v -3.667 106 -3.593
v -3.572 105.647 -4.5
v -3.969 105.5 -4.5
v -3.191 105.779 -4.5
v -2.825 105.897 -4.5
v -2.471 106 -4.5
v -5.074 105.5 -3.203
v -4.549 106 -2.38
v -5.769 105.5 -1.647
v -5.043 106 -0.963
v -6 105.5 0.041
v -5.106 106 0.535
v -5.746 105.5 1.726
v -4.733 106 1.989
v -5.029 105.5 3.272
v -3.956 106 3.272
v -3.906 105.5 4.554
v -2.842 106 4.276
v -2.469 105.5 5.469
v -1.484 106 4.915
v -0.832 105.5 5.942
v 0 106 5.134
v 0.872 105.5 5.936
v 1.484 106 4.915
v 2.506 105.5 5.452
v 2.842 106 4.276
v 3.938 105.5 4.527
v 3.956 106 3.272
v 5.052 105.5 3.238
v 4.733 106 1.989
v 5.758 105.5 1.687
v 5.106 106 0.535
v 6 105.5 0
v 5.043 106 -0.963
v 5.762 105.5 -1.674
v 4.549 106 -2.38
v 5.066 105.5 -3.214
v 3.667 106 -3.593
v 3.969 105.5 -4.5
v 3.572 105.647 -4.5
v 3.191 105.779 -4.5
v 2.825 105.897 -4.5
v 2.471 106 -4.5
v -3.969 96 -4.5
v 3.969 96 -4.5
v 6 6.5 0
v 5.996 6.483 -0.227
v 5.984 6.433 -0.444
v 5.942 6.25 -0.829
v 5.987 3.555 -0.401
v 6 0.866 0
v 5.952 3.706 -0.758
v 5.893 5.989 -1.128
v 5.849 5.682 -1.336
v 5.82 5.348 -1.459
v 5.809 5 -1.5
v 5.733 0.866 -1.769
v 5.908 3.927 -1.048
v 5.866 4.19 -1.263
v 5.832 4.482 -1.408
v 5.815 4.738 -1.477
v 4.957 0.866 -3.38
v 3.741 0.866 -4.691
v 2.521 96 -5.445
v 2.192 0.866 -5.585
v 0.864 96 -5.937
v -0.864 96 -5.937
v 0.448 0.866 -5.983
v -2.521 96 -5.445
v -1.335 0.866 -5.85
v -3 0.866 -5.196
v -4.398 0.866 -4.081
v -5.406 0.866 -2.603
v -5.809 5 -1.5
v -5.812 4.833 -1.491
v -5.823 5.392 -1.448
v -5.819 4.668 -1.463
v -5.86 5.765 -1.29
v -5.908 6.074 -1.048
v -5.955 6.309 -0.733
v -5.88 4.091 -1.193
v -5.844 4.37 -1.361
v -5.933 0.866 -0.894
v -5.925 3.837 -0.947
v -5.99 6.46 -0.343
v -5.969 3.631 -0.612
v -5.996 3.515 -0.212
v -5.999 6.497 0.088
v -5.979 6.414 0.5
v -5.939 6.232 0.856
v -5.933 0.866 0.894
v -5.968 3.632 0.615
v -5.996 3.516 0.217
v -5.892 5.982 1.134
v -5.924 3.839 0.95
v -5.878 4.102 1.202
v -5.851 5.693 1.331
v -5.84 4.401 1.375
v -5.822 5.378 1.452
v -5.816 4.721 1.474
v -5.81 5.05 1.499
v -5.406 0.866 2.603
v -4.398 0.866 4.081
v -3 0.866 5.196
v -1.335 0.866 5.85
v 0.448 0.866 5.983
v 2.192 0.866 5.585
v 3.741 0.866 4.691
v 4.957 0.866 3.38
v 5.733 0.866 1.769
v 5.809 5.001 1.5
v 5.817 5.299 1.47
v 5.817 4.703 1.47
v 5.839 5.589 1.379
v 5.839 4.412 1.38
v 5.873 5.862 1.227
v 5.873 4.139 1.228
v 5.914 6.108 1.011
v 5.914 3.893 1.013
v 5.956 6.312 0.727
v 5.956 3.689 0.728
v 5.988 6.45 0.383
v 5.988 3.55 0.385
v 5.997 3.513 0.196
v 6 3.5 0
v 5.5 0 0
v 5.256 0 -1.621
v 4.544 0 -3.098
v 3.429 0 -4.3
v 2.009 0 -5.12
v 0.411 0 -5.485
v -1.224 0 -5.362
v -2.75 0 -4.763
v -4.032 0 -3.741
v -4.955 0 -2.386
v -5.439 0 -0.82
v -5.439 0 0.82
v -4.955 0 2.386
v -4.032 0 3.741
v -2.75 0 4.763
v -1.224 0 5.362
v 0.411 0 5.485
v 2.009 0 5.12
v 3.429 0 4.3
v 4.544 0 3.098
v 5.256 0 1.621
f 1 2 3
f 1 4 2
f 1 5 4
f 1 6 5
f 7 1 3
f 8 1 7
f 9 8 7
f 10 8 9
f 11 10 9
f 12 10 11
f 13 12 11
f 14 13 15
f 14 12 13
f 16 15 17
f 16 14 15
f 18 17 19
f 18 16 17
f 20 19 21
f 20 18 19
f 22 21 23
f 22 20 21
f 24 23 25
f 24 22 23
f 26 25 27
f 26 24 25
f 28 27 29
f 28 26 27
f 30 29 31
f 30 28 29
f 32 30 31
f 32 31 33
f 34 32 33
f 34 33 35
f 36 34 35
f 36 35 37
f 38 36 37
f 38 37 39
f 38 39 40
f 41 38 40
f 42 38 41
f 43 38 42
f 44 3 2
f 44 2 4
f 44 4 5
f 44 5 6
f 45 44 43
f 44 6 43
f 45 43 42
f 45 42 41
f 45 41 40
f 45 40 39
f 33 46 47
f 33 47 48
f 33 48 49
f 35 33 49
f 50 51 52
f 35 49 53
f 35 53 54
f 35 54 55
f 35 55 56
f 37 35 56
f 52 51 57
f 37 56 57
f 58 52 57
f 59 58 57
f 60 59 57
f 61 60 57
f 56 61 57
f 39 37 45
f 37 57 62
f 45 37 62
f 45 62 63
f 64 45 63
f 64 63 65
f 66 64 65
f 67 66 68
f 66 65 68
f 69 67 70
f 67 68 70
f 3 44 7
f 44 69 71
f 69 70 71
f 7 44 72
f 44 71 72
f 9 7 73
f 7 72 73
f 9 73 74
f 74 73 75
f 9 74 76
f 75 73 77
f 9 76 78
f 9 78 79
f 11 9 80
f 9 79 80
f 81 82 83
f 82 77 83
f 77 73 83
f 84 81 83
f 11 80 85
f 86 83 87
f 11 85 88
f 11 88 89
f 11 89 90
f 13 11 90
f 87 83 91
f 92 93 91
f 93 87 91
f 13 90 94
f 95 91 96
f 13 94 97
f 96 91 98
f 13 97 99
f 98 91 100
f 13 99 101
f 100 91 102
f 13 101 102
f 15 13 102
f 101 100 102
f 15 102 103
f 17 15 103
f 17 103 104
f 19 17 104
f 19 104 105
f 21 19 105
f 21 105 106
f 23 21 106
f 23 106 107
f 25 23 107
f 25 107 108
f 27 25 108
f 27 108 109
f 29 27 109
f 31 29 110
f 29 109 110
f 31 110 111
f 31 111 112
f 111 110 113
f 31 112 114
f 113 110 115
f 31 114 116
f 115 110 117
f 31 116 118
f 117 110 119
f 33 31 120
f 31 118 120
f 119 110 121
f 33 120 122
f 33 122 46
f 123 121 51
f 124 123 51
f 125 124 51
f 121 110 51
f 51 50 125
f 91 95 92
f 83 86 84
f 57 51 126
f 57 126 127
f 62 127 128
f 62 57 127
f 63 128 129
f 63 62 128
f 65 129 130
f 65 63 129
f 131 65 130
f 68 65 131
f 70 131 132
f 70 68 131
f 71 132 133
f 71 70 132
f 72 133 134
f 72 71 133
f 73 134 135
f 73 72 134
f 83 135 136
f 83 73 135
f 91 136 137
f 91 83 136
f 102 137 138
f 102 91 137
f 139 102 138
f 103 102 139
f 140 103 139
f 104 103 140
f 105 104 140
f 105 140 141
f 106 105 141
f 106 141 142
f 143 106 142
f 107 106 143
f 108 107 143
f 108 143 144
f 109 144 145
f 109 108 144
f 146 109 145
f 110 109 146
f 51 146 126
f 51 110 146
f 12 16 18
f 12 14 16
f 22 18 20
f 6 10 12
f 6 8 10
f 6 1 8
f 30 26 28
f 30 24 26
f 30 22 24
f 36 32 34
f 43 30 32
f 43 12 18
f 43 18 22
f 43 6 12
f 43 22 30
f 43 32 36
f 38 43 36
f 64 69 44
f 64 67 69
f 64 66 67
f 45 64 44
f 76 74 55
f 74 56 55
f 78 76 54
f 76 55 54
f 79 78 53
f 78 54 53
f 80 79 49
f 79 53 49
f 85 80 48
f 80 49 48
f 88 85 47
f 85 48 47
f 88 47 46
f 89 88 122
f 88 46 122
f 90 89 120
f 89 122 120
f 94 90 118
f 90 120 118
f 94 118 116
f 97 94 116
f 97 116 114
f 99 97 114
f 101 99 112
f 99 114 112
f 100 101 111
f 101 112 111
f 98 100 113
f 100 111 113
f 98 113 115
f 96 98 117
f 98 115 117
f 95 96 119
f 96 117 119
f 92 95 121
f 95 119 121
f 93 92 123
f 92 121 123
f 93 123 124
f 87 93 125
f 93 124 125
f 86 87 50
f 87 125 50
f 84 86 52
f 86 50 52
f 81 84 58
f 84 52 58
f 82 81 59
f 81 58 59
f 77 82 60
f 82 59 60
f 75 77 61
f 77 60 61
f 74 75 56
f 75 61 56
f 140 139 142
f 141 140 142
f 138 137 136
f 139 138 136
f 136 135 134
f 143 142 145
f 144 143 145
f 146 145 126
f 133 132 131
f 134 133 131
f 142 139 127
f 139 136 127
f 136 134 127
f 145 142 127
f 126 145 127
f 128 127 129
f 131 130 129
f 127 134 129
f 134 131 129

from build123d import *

# Parameters (mm, degrees)
SKETCH1_R             = 6
BOSS_EXTRUDE1_DEPTH   = 106
SKETCH2_W             = 13.926547721
SKETCH2_H             = 4.090447759
CUT_EXTRUDE1_DEPTH    = 10
SKETCH3_R             = 1.5
CUT_EXTRUDE2_DEPTH    = 10
CHAMFER1_SIZE         = 0.5
CHAMFER1_SIZE2        = 0.866025404
CHAMFER1_PART_2_SIZE  = 0.5
CHAMFER1_PART_2_SIZE2 = 0.866025404


with BuildPart() as part:
    # Sketch1 → Boss-Extrude1 (new body)
    with BuildSketch(Plane(origin=(0, 0, 0), x_dir=(1, 0, 0), z_dir=(0, 1, 0))):
        Circle(SKETCH1_R)
    extrude(amount=BOSS_EXTRUDE1_DEPTH)

    # Sketch2 → Cut-Extrude1 (cut)
    with BuildSketch(Plane(origin=(0, 106, 0), x_dir=(1, 0, 0), z_dir=(0, 1, 0))):
        with Locations((0.543038745, 6.545223879)):
            Rectangle(SKETCH2_W, SKETCH2_H)
    extrude(amount=-CUT_EXTRUDE1_DEPTH, mode=Mode.SUBTRACT)

    # Sketch3 → Cut-Extrude2 (cut, symmetric)
    with BuildSketch(Plane(origin=(0, 0, 0), x_dir=(0, 0, -1), z_dir=(1, 0, 0))):
        with Locations((0, 5)):
            Circle(SKETCH3_R)
    extrude(amount=CUT_EXTRUDE2_DEPTH, both=True, mode=Mode.SUBTRACT)

    # Chamfer1
    chamfer1_edges = [part.edges().sort_by_distance(p)[0] for p in [
        (-6, 0, 0),
    ]]
    chamfer1_side = [part.faces().sort_by_distance(p)[0] for p in [
        (0, 0, 0),
    ]]
    chamfer(chamfer1_edges, length=CHAMFER1_SIZE, length2=CHAMFER1_SIZE2, reference=chamfer1_side[0])

    # Chamfer1 part 2
    chamfer1_part_2_edges = [part.edges().sort_by_distance(p)[0] for p in [
        (-2.468626967, 106, 5.468626967),
    ]]
    chamfer1_part_2_side = [part.faces().sort_by_distance(p)[0] for p in [
        (-6, 53, 0),
    ]]
    chamfer(chamfer1_part_2_edges, length=CHAMFER1_PART_2_SIZE, length2=CHAMFER1_PART_2_SIZE2, reference=chamfer1_part_2_side[0])


solid = part.part
